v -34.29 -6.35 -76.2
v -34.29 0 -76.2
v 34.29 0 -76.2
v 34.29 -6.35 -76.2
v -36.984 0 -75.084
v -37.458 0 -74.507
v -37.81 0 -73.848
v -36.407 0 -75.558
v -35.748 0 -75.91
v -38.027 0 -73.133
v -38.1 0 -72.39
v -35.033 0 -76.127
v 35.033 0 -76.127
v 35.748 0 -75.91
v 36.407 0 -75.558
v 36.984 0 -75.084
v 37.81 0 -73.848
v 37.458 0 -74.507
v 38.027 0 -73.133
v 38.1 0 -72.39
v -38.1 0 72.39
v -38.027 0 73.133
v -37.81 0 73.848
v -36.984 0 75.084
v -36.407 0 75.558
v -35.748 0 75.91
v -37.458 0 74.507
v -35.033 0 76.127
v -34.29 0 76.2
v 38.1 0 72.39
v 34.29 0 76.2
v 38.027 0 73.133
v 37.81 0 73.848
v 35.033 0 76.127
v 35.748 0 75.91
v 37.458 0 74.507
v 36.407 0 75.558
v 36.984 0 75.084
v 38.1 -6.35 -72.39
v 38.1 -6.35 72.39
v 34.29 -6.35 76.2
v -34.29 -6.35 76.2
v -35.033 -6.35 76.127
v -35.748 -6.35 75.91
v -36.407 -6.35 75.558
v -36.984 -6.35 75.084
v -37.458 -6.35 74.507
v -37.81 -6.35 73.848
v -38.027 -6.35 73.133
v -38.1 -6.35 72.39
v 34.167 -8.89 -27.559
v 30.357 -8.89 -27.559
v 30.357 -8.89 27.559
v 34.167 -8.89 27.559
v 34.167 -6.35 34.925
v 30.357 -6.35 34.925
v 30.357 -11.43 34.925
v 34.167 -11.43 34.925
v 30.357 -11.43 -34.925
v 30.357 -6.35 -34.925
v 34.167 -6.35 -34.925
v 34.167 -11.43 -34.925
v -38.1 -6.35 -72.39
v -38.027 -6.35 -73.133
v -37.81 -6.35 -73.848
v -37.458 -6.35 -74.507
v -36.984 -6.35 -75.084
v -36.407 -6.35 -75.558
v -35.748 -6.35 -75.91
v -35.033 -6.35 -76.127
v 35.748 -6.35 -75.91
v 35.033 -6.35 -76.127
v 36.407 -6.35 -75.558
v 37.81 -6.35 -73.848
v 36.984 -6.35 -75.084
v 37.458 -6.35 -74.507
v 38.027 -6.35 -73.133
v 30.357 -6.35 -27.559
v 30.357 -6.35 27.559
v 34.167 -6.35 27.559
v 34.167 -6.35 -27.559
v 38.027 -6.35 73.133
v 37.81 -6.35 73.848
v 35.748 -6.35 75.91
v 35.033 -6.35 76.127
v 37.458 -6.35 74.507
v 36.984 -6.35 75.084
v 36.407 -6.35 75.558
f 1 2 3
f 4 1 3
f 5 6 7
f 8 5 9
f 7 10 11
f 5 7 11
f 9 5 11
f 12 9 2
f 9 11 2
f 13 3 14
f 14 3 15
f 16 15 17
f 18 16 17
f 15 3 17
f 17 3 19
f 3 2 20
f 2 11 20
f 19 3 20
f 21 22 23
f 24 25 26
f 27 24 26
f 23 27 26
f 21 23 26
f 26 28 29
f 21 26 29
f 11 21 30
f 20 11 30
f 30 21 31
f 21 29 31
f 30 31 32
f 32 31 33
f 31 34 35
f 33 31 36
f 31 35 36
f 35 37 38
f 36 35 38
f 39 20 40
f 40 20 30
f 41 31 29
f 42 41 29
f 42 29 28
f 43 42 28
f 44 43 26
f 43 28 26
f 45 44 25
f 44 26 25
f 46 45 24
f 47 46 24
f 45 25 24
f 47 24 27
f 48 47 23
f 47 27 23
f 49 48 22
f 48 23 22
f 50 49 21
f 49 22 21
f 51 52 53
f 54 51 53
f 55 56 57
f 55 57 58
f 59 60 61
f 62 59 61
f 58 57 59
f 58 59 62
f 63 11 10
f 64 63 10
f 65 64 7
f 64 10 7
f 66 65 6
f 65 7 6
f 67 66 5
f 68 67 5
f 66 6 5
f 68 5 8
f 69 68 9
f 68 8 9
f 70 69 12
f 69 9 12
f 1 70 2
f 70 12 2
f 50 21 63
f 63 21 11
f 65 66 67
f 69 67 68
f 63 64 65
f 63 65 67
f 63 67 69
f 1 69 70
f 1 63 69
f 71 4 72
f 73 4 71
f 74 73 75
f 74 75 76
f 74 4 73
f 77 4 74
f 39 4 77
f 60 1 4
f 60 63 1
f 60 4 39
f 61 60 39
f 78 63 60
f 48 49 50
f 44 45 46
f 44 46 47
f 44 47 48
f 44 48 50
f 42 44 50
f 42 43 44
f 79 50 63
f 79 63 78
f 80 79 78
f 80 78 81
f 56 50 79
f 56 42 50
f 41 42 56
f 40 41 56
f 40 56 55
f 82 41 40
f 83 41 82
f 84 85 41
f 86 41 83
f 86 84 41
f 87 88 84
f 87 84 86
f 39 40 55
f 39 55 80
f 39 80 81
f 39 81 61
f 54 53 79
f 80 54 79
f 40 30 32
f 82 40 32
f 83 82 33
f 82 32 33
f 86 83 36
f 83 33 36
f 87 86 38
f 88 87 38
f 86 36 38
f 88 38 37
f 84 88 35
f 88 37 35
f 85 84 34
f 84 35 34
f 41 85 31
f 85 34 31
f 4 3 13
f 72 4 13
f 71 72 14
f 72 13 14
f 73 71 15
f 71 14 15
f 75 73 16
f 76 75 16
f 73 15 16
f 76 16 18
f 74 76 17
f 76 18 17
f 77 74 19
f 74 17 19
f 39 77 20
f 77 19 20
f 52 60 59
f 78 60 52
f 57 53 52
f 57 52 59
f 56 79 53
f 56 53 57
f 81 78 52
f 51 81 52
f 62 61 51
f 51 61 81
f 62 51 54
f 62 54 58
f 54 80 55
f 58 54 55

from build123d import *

# Parameters (mm, degrees)
F1_DEPTH = 6.35
F2_W     = 3.81
F2_H     = 69.85
F3_DEPTH = 5.08
F5_DEPTH = 25.4


with BuildPart() as f1:
    # F0 (on Front) → F1 (new body)
    with BuildSketch(Plane.XZ):
        with BuildLine():
            ThreePointArc((38.1, 72.39), (36.984077, 75.084077), (34.29, 76.2))
            Line((34.29, 76.2), (-34.29, 76.2))
            ThreePointArc((-34.29, 76.2), (-36.984077, 75.084077), (-38.1, 72.39))
            Line((-38.1, 72.39), (-38.1, -72.39))
            ThreePointArc((-38.1, -72.39), (-36.984077, -75.084077), (-34.29, -76.2))
            Line((-34.29, -76.2), (34.29, -76.2))
            ThreePointArc((34.29, -76.2), (36.984077, -75.084077), (38.1, -72.39))
            Line((38.1, -72.39), (38.1, 72.39))
        make_face()
    extrude(amount=F1_DEPTH)

    # F2 (on face) → F3 (join)
    with BuildSketch(Plane.XZ.offset(6.35)):
        with Locations((32.262094, 0)):
            Rectangle(F2_W, F2_H)
    extrude(amount=F3_DEPTH)

    # F4 (on face) → F5 (cut)
    with BuildSketch(Plane(origin=(30.357094, 0, 0), x_dir=(0, -1, 0), z_dir=(-1, 0, 0))):
        Polygon((6.35, 27.559), (6.35, 0), (6.35, -27.559), (8.89, -27.559), (8.89, 27.559), align=None)
    extrude(amount=-F5_DEPTH, mode=Mode.SUBTRACT)


solid = f1.part
